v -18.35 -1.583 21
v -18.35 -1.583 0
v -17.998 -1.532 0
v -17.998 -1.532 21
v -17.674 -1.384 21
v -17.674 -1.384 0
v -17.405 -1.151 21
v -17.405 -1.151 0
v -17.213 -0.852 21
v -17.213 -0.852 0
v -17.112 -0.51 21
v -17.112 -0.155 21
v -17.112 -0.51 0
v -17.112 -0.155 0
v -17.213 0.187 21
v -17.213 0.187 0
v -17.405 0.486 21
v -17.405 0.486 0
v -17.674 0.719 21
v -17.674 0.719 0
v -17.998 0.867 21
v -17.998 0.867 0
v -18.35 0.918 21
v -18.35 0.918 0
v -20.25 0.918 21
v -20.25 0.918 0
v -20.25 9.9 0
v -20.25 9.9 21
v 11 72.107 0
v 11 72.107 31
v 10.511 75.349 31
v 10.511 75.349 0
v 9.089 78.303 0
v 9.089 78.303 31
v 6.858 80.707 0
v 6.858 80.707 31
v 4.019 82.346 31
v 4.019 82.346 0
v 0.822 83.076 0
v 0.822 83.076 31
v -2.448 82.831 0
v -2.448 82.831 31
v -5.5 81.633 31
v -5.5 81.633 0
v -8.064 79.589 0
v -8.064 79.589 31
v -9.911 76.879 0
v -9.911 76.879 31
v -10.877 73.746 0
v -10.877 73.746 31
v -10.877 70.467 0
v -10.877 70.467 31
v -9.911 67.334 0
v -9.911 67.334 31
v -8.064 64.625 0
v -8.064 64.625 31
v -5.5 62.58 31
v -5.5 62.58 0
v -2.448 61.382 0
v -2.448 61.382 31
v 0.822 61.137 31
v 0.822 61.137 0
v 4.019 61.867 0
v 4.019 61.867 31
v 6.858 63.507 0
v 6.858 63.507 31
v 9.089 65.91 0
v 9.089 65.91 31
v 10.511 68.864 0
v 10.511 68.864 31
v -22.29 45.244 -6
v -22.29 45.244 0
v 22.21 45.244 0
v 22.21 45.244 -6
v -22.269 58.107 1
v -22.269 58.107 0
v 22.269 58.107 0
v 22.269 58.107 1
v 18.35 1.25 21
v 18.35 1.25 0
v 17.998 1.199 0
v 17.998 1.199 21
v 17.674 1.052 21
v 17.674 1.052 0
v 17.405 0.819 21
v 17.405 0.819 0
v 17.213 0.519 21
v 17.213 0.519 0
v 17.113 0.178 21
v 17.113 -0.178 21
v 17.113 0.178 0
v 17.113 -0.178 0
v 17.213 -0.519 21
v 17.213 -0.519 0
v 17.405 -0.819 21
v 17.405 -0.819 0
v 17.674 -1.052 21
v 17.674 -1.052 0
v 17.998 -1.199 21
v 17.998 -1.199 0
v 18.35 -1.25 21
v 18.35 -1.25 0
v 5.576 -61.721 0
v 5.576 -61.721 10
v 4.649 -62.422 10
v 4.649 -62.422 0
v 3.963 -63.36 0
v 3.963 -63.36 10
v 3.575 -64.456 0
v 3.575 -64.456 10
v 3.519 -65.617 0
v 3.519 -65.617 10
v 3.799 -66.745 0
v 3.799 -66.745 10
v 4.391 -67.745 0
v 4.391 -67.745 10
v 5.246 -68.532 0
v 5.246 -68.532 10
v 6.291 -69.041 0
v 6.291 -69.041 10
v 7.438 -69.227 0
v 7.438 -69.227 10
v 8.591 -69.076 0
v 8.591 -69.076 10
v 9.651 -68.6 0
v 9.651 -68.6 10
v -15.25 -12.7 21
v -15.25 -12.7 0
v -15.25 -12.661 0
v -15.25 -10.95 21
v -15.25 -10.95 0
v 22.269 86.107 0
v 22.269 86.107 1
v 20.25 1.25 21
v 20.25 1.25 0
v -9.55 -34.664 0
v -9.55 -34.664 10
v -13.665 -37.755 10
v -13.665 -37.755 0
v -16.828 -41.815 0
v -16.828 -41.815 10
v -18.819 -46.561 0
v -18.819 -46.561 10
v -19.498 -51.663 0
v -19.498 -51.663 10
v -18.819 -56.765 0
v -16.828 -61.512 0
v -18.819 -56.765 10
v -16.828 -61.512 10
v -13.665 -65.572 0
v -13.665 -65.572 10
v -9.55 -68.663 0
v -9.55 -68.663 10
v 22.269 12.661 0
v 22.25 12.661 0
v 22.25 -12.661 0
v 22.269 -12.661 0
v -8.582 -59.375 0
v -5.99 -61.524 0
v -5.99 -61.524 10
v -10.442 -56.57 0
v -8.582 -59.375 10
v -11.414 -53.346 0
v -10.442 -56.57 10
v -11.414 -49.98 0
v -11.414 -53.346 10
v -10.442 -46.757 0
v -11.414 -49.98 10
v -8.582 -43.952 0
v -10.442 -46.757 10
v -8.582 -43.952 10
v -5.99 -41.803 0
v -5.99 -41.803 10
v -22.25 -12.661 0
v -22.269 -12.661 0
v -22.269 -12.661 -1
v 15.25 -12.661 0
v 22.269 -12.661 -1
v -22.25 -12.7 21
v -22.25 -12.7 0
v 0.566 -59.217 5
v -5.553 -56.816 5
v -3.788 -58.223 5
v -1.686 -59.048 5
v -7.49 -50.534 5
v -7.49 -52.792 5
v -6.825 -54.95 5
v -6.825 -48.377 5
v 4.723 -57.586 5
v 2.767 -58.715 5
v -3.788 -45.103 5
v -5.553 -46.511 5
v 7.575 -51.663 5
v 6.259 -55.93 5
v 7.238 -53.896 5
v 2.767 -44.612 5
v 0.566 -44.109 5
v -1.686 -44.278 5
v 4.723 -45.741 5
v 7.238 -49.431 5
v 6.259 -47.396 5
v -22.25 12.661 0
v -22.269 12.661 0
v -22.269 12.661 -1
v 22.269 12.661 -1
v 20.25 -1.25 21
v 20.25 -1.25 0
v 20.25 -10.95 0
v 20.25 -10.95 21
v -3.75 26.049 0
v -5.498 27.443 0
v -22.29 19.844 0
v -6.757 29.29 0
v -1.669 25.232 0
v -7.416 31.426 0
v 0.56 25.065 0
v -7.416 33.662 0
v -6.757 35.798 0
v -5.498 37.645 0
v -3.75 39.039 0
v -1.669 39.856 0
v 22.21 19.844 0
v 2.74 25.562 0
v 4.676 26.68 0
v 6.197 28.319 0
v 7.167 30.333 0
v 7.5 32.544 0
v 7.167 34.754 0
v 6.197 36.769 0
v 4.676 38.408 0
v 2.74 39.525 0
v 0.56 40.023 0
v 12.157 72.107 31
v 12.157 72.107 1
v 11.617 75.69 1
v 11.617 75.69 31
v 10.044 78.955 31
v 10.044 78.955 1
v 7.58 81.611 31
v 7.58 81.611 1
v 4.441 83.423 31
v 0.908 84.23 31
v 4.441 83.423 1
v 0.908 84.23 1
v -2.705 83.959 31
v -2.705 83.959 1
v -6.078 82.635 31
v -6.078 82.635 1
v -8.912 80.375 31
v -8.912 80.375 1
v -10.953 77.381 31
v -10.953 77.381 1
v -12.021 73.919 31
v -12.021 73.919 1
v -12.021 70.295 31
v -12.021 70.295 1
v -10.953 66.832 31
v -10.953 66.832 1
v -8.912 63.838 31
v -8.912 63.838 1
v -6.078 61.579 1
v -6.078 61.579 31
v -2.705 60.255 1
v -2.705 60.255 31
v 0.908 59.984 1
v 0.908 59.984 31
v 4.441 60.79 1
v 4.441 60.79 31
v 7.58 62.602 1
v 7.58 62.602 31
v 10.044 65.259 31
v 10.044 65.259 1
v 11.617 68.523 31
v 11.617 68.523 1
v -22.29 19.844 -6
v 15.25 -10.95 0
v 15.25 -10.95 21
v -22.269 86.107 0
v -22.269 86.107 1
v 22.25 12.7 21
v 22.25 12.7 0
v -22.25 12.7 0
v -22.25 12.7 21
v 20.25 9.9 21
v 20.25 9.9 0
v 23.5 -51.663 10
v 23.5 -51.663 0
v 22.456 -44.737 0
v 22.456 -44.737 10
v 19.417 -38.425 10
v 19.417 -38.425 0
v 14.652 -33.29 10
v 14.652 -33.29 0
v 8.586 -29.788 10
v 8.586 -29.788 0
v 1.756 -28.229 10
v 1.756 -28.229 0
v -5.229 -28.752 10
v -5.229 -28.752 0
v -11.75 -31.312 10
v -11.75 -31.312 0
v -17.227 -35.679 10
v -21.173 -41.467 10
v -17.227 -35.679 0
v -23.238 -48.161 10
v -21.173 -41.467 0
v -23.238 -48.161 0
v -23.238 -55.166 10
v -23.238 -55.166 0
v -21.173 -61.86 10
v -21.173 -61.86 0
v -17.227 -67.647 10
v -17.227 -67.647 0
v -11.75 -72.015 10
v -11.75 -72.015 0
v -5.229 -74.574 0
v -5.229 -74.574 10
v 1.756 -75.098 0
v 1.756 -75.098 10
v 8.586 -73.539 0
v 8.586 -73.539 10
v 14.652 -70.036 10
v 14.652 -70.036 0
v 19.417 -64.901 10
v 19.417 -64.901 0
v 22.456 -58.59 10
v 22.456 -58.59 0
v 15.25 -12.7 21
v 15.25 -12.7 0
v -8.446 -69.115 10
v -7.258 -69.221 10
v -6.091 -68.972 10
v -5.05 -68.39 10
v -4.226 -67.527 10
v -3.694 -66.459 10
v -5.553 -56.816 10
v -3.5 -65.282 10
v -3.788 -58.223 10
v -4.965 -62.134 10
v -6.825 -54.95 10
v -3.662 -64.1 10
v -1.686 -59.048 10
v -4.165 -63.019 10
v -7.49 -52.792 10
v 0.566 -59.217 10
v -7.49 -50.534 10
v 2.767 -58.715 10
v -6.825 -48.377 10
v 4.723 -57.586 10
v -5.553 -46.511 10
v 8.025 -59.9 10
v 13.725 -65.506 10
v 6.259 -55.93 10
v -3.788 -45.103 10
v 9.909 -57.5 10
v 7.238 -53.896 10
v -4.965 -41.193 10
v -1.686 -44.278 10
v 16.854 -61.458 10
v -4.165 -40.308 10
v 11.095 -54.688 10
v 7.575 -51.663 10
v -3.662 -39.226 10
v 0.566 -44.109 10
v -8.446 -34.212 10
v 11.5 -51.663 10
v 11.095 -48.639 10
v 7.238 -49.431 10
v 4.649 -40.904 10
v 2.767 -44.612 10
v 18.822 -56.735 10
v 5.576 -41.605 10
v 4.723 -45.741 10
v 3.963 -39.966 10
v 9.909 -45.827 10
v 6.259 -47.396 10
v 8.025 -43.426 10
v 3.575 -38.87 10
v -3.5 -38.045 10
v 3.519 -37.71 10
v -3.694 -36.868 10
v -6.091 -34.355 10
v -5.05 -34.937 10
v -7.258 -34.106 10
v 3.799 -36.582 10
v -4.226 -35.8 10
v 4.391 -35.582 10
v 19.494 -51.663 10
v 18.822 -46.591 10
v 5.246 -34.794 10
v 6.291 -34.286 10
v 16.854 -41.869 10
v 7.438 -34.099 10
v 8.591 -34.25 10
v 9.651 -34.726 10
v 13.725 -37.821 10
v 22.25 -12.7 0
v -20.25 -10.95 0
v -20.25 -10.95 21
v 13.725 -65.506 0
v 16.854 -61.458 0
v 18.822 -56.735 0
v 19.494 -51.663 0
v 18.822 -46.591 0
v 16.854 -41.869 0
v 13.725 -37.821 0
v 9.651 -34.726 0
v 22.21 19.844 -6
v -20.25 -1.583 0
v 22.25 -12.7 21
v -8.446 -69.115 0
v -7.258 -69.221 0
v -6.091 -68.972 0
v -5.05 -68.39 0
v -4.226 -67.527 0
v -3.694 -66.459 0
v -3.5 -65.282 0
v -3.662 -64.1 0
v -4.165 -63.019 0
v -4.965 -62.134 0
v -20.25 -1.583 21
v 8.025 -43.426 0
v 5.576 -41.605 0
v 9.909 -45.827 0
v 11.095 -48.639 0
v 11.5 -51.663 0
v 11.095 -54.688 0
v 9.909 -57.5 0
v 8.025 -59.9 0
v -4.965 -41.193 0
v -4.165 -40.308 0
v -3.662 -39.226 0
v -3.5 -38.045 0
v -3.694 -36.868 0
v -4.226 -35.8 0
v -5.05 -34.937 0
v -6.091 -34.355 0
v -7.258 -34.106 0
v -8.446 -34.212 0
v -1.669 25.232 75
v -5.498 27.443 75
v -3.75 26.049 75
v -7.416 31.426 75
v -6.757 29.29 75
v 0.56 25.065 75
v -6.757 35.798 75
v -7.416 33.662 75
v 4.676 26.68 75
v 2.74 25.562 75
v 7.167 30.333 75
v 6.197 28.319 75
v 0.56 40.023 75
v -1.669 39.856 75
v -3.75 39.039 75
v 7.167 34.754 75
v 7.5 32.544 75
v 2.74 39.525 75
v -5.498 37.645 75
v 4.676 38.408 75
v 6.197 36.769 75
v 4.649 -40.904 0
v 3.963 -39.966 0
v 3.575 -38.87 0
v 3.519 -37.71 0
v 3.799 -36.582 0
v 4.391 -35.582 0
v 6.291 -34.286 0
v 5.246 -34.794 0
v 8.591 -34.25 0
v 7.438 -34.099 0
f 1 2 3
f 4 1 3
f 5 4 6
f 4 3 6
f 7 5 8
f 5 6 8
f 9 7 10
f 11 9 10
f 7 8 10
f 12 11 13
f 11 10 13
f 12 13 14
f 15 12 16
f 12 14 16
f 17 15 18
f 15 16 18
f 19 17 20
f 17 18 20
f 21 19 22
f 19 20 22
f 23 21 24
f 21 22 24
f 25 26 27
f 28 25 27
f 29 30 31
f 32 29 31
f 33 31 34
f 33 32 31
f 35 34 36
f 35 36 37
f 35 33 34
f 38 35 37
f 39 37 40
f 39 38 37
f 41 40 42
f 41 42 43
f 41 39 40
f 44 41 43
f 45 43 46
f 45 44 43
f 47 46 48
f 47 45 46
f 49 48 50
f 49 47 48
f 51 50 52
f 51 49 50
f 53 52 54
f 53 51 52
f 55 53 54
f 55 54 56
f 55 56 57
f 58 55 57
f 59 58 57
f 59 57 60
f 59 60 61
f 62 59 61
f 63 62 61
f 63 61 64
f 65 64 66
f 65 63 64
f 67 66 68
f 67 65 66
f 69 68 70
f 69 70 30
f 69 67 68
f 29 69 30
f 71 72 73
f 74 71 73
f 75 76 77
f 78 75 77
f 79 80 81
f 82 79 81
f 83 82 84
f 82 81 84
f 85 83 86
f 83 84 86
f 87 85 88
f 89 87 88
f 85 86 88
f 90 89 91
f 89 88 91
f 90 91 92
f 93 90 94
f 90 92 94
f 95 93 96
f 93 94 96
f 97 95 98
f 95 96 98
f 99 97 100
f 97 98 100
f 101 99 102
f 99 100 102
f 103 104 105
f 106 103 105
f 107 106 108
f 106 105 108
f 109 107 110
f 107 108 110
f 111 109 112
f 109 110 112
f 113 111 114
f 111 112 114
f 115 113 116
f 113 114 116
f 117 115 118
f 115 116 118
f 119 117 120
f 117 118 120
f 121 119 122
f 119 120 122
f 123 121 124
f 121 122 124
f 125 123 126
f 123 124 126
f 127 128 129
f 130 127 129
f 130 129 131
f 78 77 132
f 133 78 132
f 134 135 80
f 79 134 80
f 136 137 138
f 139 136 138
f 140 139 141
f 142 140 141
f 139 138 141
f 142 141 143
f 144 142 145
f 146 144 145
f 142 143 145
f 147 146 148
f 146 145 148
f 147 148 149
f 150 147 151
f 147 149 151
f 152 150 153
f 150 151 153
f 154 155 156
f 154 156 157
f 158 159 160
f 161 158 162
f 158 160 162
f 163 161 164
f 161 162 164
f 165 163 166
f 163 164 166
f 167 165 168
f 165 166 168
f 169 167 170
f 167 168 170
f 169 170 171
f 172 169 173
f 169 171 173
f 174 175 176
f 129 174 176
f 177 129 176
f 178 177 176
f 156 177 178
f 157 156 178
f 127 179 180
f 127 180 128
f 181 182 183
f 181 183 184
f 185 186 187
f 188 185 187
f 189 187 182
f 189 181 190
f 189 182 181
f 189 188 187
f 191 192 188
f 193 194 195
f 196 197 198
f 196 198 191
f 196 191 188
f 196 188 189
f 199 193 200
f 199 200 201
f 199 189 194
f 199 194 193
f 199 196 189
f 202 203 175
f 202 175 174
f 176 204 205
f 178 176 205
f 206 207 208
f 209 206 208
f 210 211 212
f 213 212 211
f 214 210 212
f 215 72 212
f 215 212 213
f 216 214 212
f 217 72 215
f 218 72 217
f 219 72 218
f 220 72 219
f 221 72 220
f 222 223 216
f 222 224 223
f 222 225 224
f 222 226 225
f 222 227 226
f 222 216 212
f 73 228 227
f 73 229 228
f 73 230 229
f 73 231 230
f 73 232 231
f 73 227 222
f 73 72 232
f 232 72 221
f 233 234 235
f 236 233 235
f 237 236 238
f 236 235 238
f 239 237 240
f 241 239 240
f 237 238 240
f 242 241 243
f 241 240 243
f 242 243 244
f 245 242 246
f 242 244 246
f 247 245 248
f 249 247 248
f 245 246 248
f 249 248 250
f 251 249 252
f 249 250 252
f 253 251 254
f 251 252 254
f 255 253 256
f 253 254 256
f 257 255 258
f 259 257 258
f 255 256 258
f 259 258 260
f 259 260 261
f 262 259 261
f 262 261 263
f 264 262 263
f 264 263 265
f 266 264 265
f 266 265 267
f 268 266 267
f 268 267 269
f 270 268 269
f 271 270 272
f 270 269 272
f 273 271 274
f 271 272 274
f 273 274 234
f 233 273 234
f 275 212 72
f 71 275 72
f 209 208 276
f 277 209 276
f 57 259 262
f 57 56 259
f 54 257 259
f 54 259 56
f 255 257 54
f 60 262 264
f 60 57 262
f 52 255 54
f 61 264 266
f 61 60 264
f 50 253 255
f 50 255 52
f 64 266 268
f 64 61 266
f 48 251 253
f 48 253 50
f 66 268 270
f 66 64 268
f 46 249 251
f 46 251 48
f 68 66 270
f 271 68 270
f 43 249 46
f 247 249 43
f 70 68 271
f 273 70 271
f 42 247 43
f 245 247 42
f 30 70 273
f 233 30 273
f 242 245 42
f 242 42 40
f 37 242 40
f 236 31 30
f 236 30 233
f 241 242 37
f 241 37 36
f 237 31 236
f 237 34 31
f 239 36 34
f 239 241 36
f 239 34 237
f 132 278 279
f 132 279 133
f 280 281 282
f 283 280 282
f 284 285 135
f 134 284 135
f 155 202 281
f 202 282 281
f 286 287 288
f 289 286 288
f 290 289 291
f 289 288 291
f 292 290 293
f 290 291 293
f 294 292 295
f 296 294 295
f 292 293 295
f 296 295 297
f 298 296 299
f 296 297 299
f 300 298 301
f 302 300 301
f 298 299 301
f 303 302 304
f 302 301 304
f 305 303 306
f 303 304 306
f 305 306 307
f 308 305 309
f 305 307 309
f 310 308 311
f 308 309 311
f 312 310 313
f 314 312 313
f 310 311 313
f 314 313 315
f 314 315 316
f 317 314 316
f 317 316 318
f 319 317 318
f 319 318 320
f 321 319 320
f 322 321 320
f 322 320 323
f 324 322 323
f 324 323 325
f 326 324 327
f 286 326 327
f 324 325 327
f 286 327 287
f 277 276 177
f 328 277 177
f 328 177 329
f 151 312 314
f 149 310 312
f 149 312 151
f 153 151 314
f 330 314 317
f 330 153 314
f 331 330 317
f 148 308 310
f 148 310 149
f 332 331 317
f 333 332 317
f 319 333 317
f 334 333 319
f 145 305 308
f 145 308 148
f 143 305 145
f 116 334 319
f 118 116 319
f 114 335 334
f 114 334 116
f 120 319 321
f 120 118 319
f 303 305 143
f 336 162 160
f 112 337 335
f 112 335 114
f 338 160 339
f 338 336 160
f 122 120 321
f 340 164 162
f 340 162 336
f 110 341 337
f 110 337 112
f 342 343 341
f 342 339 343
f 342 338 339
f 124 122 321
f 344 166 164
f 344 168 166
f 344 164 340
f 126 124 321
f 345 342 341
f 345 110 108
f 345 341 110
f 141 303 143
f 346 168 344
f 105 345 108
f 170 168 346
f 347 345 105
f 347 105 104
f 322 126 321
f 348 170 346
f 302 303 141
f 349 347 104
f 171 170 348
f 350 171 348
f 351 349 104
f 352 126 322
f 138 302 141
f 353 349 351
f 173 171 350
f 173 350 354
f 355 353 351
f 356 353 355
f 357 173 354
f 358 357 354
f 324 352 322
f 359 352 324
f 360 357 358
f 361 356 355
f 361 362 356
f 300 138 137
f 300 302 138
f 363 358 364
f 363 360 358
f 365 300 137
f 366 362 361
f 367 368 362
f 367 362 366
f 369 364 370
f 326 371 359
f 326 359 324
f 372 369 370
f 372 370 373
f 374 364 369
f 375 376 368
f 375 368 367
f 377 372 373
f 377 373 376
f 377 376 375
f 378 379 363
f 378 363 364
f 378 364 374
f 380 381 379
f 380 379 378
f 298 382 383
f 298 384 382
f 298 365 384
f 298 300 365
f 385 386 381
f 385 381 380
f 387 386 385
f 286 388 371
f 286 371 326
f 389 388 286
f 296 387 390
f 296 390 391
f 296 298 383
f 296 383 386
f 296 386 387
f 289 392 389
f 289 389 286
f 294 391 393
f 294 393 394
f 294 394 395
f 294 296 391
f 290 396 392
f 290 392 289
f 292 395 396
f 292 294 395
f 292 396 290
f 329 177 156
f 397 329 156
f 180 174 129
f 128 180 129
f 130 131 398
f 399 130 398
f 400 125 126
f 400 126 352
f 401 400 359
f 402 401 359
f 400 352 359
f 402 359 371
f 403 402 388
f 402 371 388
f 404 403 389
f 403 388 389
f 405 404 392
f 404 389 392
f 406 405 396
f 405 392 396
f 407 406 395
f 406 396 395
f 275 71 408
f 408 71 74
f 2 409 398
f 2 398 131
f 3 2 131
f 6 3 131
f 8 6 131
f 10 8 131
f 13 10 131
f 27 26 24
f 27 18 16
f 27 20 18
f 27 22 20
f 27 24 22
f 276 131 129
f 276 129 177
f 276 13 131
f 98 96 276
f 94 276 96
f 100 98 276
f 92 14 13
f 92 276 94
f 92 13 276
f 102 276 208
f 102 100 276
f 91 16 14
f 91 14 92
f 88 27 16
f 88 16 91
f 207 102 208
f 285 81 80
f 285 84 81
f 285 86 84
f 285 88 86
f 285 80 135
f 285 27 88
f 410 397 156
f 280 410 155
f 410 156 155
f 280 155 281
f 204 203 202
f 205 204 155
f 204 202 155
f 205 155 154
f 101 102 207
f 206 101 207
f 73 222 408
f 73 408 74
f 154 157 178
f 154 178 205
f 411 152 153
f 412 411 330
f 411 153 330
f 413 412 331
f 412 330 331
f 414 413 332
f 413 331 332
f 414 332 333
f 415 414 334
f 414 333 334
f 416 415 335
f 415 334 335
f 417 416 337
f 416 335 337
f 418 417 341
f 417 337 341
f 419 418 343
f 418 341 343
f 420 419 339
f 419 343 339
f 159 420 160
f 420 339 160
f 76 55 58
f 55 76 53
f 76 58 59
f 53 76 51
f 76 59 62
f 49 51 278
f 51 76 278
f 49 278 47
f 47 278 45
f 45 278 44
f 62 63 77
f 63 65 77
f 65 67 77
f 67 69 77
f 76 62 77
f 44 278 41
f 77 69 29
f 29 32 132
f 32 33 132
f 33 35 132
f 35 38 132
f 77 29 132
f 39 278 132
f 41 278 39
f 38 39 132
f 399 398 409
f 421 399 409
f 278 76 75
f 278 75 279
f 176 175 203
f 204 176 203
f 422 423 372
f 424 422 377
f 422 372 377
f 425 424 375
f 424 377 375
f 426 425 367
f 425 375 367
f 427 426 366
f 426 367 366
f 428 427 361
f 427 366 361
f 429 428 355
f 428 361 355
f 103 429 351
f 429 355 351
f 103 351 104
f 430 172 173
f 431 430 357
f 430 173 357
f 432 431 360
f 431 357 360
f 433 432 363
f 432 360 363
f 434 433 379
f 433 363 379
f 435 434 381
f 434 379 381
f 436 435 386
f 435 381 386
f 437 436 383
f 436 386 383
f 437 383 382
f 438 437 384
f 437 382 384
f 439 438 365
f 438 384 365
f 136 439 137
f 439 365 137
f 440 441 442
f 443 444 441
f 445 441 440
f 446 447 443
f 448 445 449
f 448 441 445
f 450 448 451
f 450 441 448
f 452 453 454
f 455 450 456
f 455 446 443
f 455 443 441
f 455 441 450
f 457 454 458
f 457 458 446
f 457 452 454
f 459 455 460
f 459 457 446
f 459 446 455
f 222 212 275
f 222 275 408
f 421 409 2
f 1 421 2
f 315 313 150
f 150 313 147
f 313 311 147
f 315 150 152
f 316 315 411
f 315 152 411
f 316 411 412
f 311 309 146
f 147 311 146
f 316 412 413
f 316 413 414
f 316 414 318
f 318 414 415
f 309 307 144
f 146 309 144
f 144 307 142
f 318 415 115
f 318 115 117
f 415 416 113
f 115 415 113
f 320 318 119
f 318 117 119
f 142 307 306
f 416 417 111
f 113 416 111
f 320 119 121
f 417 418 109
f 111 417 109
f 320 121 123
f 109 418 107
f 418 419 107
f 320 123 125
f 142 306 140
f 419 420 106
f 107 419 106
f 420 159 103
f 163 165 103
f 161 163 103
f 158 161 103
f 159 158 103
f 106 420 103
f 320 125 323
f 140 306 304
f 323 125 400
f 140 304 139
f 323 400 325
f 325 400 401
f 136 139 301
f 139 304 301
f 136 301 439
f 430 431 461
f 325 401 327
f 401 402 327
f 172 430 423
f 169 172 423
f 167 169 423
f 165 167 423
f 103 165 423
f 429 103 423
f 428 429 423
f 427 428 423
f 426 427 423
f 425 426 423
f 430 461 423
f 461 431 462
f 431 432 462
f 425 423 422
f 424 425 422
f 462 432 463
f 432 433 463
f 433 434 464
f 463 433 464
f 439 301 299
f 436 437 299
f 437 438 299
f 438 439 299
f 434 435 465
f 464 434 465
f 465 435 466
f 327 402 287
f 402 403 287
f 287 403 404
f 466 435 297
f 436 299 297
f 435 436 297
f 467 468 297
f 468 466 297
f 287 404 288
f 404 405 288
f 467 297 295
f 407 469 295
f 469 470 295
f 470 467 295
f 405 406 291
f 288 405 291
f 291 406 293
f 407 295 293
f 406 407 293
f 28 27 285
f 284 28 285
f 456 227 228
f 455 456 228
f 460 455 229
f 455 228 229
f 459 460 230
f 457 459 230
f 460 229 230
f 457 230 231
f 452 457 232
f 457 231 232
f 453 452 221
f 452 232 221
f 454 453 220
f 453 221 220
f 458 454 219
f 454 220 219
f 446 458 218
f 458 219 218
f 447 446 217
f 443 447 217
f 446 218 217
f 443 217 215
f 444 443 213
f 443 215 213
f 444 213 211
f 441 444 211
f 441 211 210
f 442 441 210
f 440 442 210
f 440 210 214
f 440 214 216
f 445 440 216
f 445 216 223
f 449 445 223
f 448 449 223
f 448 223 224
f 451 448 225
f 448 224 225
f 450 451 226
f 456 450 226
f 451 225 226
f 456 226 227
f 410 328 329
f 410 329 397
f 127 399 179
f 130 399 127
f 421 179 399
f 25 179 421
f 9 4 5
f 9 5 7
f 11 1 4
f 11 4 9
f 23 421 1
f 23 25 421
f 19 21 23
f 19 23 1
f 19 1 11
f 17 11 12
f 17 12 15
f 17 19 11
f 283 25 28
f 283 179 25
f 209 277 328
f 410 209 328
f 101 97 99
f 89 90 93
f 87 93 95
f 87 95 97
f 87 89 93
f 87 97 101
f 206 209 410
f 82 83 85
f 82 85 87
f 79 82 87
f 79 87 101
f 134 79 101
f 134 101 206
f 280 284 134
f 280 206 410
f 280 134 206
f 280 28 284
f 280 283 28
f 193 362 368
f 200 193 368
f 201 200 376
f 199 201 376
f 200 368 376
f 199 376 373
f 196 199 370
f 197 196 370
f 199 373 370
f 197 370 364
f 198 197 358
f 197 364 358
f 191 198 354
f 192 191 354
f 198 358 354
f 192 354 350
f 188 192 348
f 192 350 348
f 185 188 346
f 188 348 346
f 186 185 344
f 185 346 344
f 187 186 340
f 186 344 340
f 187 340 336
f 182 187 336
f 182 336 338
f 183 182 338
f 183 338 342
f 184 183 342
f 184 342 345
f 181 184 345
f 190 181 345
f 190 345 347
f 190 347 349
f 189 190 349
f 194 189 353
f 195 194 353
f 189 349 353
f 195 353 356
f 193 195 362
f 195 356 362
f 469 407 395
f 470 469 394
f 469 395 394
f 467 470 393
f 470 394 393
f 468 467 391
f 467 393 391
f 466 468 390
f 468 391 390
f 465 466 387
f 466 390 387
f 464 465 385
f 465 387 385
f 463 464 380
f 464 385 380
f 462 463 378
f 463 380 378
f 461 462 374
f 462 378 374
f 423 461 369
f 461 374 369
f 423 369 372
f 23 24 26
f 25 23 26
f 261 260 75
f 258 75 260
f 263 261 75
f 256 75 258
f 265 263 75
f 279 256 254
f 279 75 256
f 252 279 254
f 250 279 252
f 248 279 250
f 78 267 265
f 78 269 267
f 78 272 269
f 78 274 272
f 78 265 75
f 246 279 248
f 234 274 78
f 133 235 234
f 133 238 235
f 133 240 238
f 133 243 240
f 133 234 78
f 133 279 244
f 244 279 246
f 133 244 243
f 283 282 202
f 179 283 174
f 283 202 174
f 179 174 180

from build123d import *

# Parameters (mm, degrees)
F2_DEPTH  = 21
F0_W      = 44.5381999016
F0_H      = 25.3221206367
F3_DEPTH  = 1
F1_W      = 44.5
F1_H      = 25.4
F4_DEPTH  = 6
F5_R      = 7.5
F6_DEPTH  = 75
F7_R      = 23.5
F8_DEPTH  = 10
F10_D     = 8
F12_DEPTH = 25
F13_W     = 44.538
F13_H     = 28
F13_R     = 11
F14_DEPTH = 1
F15_R     = 12.1568017558
F15_R_2   = 11
F16_DEPTH = 30
F17_R     = 7.575
F18_DEPTH = 5


with BuildPart() as f2:
    # F1 (on Top) → F2 (new body)
    with BuildSketch(Plane.XY):
        with BuildLine():
            Line((-19.25, 9.9), (20.25, 9.9))
            Line((20.25, 9.9), (20.25, 1.25))
            Line((20.25, 1.25), (18.35, 1.25))
            ThreePointArc((18.35, 1.25), (17.1, 0), (18.35, -1.25))
            Line((18.35, -1.25), (20.25, -1.25))
            Line((20.25, -1.25), (20.25, -9.7038764507))
            Line((20.25, -9.7038764507), (20.25, -10.95))
            Line((20.25, -10.95), (15.25, -10.95))
            Line((15.25, -10.95), (15.25, -12.7))
            Line((15.25, -12.7), (22.25, -12.7))
            Line((22.25, -12.7), (22.25, 12.7))
            Line((22.25, 12.7), (-22.25, 12.7))
            Line((-22.25, 12.7), (-22.25, -12.7))
            Line((-22.25, -12.7), (-15.25, -12.7))
            Line((-15.25, -12.7), (-15.25, -10.95))
            Line((-15.25, -10.95), (-20.25, -10.95))
            Line((-20.25, -10.95), (-20.25, -9.7))
            Line((-20.25, -9.7), (-20.25, -1.5828977921))
            Line((-20.25, -1.5828977921), (-18.35, -1.5828977921))
            ThreePointArc((-18.35, -1.5828977921), (-17.0996297668, -0.3325275589), (-18.35, 0.9178426743))
            Line((-18.35, 0.9178426743), (-20.25, 0.9178426743))
            Line((-20.25, 0.9178426743), (-20.25, 9.9))
            Line((-20.25, 9.9), (-19.25, 9.9))
        make_face()
    extrude(amount=F2_DEPTH)

    # F0 (on Top) → F3 (join)
    with BuildSketch(Plane.XY):
        Rectangle(F0_W, F0_H)
    extrude(amount=-F3_DEPTH)


with BuildPart() as f4:
    # F1 (on Top) → F4 (new body)
    with BuildSketch(Plane.XY):
        with Locations((-0.040480867, 32.5438007712)):
            Rectangle(F1_W, F1_H)
    extrude(amount=-F4_DEPTH)

    # F5 (on face) → F6 (join)
    with BuildSketch(Plane.XY):
        with Locations((0, 32.5438007712)):
            Circle(F5_R)
    extrude(amount=F6_DEPTH)


with BuildPart() as f8:
    # F7 (on Top) → F8 (new body)
    with BuildSketch(Plane.XY):
        with Locations((0, -51.663291269)):
            Circle(F7_R)
    extrude(amount=F8_DEPTH)

    # F10 (through all)
    with Locations(Plane(origin=(0, 0, 0), x_dir=(1, 0, 0), z_dir=(0, 0, -1))):
        with Locations((-7.5, 38.0986313028), (7.5, 38.0986313028), (-7.5, 65.2279512353), (7.5, 65.2279512353)):
            Hole(F10_D / 2)

    # F11 (on face) → F12 (cut)
    with BuildSketch(Plane.XY.offset(10)):
        with BuildLine():
            ThreePointArc((11.5, -65.2279512353), (11.007417817, -67.1509749628), (9.6509898716, -68.6003750776))
            ThreePointArc((9.6509898716, -68.6003750776), (19.4937531902, -51.663291269), (9.6509898716, -34.7262074605))
            ThreePointArc((9.6509898716, -34.7262074605), (4.0651326687, -36.0488297473), (5.5531980506, -41.5929069315))
            ThreePointArc((5.5531980506, -41.5929069315), (11.500020945, -51.6503468012), (5.5758544768, -61.7211487022))
            ThreePointArc((5.5758544768, -61.7211487022), (9.5375742818, -61.7858165711), (11.5, -65.2279512353))
        make_face()
        with BuildLine():
            ThreePointArc((-9.5496674592, -68.6628985867), (-11.0797578572, -63.4432009211), (-5.9903344615, -61.5237765685))
            ThreePointArc((-5.9903344615, -61.5237765685), (-11.5374727433, -51.663291269), (-5.9903344615, -41.8028059695))
            ThreePointArc((-5.9903344615, -41.8028059695), (-11.0797578572, -39.8833816169), (-9.5496674592, -34.6636839514))
            ThreePointArc((-9.5496674592, -34.6636839514), (-19.4982767837, -51.663291269), (-9.5496674592, -68.6628985867))
        make_face()
    extrude(amount=-F12_DEPTH, mode=Mode.SUBTRACT)

    # F17 (on face) → F18 (cut)
    with BuildSketch(Plane.XY.offset(10)):
        with Locations((0, -51.663291269)):
            Circle(F17_R)
    extrude(amount=-F18_DEPTH, mode=Mode.SUBTRACT)


with BuildPart() as f14:
    # F13 (on Top) → F14 (new body)
    with BuildSketch(Plane.XY):
        with Locations((0, 72.1066973255)):
            Rectangle(F13_W, F13_H)
        with Locations((0, 72.1066973255)):
            Circle(F13_R, mode=Mode.SUBTRACT)
    extrude(amount=F14_DEPTH)

    # F15 (on face) → F16 (join)
    with BuildSketch(Plane.XY.offset(1)):
        with Locations((0, 72.1066973255)):
            Circle(F15_R)
        with Locations((0, 72.1066973255)):
            Circle(F15_R_2, mode=Mode.SUBTRACT)
    extrude(amount=F16_DEPTH)


solid = Compound([f2.part, f4.part, f8.part, f14.part])
